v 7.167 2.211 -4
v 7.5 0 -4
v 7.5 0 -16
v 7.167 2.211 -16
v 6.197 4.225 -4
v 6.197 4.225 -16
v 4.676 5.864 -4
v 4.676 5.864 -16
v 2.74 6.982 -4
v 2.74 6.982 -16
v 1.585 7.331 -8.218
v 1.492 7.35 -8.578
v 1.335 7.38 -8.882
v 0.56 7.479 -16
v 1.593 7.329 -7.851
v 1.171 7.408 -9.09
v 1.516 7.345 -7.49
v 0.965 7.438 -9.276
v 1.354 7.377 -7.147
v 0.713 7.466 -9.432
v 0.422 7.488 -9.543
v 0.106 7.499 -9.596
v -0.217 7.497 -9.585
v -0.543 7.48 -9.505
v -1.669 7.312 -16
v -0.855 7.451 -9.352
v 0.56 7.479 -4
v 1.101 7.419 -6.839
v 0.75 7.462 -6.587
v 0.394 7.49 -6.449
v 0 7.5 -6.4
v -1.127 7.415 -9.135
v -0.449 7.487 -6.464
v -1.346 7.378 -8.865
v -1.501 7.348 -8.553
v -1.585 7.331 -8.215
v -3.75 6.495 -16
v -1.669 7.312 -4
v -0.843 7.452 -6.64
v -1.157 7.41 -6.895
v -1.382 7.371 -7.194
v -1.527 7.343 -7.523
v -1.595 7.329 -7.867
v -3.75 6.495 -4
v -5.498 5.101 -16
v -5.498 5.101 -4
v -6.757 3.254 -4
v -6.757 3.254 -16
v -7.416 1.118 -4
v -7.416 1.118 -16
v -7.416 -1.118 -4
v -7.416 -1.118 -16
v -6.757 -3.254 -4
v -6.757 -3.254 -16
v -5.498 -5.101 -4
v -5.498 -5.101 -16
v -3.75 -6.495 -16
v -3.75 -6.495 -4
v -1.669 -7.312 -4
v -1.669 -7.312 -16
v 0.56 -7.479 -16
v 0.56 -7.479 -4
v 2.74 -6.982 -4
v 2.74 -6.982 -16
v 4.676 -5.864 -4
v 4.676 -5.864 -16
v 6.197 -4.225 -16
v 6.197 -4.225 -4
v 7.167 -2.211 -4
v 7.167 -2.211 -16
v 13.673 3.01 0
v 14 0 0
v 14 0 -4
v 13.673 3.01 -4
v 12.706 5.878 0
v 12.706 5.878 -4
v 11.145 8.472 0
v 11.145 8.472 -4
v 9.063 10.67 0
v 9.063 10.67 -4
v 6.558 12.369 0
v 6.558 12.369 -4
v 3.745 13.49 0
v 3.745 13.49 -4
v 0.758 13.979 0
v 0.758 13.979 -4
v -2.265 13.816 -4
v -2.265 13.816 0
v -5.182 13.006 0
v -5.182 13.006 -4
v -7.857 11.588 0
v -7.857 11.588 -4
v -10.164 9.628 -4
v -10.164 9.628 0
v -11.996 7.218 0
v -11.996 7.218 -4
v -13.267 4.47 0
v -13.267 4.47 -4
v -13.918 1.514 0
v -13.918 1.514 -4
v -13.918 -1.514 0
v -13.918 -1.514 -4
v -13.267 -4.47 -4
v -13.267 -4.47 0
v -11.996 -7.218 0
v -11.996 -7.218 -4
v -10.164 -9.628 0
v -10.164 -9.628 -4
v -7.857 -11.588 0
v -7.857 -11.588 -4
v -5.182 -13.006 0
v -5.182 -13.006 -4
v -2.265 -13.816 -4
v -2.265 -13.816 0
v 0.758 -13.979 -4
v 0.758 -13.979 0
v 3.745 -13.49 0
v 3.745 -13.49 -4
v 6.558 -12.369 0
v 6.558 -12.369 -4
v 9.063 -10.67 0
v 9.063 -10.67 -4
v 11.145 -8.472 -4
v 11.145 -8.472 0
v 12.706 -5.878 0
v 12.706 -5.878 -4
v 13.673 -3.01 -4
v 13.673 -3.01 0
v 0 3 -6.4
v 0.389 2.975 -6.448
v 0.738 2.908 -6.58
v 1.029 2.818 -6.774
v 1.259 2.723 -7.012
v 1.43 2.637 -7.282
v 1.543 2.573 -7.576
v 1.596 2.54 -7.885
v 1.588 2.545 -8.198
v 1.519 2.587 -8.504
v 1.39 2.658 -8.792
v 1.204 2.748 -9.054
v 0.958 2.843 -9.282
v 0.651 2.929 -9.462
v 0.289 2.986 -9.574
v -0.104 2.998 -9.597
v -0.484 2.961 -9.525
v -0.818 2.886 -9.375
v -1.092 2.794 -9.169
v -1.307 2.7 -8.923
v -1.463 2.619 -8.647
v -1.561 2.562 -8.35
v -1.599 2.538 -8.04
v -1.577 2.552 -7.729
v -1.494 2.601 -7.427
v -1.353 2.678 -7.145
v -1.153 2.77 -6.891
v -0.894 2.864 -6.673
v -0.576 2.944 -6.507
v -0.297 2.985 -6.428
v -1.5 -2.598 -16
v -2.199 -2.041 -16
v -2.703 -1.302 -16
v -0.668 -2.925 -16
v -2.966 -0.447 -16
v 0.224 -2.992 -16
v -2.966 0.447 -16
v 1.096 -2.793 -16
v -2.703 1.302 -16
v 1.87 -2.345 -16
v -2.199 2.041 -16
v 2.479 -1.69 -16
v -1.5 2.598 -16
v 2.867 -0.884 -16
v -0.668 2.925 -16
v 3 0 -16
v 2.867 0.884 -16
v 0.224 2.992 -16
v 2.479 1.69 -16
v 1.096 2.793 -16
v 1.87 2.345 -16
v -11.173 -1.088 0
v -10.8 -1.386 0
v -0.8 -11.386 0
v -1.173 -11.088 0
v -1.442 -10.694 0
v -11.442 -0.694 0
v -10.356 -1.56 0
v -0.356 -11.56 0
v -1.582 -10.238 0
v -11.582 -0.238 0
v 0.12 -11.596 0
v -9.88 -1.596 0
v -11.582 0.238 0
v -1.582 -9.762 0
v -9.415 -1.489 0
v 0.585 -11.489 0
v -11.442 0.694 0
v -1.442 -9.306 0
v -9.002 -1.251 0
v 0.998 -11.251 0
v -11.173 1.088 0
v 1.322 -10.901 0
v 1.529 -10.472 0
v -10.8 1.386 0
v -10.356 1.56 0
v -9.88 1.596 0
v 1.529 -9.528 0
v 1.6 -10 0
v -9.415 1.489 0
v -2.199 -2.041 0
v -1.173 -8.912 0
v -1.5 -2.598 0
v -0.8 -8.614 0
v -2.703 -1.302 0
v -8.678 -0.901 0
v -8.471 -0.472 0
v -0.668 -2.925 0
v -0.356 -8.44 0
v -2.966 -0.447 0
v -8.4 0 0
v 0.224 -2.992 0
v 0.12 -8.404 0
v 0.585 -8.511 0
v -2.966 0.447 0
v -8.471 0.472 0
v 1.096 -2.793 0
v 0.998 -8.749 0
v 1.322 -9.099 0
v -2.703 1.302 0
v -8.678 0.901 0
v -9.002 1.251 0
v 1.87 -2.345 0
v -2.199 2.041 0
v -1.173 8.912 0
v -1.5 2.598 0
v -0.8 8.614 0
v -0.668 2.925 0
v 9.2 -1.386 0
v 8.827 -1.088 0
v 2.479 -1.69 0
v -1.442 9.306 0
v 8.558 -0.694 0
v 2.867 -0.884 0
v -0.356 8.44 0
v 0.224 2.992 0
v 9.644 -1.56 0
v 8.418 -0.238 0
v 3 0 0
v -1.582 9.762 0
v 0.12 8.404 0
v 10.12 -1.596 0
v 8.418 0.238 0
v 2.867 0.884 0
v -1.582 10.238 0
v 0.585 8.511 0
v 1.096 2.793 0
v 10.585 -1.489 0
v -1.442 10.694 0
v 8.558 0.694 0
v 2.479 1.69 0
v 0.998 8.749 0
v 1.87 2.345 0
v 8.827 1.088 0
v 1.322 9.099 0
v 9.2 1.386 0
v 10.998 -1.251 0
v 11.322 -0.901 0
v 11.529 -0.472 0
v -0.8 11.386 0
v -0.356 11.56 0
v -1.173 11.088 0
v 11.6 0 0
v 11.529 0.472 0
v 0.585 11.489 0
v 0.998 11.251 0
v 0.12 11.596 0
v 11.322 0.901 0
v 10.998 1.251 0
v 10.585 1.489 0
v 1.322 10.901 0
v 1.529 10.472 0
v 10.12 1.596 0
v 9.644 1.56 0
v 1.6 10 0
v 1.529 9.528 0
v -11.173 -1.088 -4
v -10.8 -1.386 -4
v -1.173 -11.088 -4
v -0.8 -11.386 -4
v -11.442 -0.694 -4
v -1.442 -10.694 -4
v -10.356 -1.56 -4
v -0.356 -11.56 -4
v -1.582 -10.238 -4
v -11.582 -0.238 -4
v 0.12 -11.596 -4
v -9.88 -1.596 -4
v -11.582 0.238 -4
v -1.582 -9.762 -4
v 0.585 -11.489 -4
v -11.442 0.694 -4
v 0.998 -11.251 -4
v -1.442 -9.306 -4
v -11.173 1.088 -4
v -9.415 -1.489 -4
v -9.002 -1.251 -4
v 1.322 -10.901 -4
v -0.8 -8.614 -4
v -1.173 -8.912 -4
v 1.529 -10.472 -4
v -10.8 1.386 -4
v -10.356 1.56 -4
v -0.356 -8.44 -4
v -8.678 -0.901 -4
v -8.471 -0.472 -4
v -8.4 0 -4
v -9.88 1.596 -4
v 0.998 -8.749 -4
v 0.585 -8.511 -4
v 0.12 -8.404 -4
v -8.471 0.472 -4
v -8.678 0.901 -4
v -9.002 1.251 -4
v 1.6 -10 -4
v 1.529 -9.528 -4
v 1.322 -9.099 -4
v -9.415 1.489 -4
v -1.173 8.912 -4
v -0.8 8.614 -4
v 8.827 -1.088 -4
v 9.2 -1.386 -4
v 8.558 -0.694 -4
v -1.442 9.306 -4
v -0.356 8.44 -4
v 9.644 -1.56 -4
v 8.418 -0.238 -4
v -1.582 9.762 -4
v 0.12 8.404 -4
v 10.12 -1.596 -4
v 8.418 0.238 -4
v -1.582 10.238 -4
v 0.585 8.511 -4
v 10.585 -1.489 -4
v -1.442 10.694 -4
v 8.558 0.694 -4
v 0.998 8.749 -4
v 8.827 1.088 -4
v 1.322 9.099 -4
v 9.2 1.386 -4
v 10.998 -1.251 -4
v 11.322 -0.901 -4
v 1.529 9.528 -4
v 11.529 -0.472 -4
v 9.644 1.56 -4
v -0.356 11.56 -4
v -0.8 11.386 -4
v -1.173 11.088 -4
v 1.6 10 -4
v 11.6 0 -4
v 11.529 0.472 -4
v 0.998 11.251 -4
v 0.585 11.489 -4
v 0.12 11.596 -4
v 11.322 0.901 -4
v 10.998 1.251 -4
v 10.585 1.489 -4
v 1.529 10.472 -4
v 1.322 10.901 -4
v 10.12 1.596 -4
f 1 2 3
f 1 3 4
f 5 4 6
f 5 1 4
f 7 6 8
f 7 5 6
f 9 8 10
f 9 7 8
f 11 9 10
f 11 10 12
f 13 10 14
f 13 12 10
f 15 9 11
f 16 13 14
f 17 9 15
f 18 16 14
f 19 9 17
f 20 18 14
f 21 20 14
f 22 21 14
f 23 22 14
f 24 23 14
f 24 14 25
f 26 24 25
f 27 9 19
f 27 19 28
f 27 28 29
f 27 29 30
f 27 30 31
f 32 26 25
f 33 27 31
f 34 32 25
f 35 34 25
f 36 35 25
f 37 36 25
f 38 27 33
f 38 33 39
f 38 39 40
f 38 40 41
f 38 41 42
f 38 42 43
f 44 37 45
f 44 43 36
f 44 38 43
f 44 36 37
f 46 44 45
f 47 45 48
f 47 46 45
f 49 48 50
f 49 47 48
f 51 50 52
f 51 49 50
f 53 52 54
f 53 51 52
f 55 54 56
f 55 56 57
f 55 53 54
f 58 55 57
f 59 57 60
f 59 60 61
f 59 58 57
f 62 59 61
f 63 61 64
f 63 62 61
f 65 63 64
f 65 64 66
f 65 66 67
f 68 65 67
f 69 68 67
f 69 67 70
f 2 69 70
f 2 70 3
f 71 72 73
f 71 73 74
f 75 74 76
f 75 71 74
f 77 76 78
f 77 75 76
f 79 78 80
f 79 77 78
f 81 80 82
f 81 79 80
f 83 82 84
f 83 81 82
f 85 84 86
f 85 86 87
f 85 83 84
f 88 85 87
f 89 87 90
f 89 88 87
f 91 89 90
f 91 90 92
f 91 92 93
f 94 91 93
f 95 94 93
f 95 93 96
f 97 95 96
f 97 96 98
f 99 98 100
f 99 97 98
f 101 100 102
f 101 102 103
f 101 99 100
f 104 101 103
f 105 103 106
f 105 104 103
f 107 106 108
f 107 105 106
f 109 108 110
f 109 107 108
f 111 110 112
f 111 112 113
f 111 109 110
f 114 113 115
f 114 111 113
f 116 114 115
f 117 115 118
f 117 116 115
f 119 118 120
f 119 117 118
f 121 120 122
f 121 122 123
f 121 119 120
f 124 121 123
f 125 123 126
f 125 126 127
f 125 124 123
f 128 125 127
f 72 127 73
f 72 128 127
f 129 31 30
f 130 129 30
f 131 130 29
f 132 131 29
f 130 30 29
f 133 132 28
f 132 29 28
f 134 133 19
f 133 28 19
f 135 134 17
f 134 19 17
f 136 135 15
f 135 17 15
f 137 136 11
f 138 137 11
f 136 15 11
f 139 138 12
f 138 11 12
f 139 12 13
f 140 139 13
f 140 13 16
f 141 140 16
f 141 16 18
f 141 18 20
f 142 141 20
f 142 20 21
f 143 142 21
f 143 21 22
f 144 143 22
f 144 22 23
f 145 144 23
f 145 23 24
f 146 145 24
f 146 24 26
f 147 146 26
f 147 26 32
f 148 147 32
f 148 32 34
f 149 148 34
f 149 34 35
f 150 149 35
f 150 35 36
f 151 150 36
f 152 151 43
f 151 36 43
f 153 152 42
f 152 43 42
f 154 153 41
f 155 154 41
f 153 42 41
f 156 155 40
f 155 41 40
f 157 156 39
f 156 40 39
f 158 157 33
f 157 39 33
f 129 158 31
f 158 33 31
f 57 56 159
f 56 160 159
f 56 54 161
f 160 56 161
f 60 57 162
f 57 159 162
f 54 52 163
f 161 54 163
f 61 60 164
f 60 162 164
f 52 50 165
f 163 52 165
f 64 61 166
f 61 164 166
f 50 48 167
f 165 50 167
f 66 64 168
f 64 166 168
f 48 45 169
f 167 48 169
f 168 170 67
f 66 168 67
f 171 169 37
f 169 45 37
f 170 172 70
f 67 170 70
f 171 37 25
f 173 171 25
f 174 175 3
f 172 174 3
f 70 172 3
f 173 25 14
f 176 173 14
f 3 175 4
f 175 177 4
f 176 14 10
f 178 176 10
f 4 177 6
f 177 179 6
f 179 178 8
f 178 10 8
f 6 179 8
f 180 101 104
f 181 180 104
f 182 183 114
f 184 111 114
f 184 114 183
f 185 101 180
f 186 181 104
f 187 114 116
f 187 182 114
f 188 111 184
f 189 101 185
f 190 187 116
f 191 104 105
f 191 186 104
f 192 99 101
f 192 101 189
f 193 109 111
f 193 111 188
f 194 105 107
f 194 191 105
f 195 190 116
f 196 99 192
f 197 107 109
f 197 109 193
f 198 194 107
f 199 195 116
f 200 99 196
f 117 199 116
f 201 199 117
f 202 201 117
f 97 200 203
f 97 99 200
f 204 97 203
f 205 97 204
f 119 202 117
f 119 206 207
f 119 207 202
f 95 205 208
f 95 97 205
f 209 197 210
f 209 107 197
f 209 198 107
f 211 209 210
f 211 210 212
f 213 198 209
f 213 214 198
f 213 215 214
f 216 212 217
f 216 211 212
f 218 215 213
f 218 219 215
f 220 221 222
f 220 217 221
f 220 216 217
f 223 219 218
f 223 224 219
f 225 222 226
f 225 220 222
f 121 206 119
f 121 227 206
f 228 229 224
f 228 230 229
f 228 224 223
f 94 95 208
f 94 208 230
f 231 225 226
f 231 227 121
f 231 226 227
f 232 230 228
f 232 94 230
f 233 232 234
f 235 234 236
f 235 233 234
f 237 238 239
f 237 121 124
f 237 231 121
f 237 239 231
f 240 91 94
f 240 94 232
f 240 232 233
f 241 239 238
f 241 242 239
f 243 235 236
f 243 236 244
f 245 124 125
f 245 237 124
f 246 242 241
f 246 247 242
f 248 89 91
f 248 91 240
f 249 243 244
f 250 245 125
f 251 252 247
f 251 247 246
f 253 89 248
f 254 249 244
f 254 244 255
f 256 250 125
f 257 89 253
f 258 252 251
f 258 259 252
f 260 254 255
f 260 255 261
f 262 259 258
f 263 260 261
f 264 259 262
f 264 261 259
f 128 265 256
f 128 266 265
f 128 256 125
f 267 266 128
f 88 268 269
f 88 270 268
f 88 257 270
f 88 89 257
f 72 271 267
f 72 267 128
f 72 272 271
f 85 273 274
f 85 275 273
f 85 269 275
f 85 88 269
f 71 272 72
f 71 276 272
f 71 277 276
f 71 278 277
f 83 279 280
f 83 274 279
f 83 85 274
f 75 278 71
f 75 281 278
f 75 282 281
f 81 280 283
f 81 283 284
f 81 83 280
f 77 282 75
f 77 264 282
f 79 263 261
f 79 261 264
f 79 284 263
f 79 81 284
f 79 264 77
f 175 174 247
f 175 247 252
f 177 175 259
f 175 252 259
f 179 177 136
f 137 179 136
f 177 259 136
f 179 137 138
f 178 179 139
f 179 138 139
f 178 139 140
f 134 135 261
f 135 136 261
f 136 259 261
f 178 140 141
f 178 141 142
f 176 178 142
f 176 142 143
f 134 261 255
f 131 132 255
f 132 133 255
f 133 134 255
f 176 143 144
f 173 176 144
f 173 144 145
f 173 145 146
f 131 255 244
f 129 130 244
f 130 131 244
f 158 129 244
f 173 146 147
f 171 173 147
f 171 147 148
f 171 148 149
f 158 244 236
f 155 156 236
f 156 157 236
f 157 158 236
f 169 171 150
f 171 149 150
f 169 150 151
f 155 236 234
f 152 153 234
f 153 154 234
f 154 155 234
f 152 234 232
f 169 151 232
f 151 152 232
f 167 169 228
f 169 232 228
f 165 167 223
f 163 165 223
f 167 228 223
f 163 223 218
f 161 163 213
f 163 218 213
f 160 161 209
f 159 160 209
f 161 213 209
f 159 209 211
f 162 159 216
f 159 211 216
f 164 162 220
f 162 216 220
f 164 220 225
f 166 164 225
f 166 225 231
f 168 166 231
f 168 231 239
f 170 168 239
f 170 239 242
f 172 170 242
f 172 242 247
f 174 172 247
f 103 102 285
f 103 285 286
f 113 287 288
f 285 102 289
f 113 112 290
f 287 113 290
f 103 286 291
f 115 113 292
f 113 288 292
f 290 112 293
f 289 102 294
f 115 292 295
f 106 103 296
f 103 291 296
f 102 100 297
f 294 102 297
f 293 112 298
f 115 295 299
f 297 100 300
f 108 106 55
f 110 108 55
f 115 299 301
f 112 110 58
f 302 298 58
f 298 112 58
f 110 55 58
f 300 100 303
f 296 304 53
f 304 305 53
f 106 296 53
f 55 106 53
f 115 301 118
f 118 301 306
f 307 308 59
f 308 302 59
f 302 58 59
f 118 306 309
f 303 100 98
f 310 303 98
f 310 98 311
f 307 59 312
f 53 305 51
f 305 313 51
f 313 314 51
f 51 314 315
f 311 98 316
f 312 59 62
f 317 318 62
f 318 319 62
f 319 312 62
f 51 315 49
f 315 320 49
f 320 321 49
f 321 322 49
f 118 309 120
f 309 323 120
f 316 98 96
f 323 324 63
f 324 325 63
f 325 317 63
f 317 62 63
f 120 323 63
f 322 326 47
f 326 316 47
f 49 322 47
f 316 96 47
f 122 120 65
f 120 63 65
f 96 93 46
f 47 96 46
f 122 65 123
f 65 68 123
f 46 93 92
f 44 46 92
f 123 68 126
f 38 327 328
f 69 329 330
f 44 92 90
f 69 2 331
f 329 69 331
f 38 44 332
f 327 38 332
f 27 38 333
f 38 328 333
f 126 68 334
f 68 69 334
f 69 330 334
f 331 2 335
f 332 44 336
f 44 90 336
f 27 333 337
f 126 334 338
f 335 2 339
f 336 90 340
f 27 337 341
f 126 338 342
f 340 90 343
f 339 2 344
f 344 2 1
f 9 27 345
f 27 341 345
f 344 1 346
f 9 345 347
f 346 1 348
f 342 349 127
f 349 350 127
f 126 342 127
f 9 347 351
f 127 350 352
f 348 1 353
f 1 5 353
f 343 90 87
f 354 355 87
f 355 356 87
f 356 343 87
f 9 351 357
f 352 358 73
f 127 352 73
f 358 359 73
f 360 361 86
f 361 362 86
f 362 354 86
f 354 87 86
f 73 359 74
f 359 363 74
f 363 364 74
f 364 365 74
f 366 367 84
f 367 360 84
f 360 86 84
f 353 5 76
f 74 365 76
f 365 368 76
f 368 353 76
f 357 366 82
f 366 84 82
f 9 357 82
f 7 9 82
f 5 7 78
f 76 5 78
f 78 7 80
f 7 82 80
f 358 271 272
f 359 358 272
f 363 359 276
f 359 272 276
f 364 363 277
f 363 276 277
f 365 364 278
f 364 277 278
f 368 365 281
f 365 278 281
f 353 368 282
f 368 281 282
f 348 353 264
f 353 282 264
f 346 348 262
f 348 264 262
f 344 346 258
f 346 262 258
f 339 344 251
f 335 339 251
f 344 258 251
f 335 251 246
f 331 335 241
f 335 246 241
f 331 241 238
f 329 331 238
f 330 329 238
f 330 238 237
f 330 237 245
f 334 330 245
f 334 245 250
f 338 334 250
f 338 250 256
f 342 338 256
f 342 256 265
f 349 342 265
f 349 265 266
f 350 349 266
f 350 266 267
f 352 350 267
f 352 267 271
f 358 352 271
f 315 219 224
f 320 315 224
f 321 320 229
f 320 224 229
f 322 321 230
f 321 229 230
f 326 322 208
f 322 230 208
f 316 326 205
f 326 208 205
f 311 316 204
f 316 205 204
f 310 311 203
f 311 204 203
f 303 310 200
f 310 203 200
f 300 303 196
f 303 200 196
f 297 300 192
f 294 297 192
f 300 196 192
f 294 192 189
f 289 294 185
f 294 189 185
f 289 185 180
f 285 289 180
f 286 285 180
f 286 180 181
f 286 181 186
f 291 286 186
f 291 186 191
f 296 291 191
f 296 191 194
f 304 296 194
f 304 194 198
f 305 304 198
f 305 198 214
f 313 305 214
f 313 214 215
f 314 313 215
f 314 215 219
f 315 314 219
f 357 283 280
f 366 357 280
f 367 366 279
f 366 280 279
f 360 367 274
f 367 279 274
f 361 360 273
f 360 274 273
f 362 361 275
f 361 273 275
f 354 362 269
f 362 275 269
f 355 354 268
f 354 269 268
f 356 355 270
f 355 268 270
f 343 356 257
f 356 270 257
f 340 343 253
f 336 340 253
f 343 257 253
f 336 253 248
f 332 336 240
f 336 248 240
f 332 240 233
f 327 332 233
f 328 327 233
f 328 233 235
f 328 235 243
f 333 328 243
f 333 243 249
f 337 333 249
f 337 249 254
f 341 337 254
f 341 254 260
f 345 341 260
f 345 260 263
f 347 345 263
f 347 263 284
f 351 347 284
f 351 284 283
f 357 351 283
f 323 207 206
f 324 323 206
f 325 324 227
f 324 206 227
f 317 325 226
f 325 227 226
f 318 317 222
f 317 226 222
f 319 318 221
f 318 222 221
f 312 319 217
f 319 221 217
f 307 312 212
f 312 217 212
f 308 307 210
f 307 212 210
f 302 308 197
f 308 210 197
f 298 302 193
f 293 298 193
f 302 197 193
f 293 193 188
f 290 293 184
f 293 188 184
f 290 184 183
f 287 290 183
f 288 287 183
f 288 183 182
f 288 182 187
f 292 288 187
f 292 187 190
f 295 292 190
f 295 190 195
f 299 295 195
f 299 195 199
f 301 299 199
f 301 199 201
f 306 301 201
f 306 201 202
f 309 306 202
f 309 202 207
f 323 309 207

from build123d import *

# Parameters (mm, degrees)
SKETCH_1_R          = 7.5
EXTRUDE_1_DEPTH     = 16
SKETCH_2_R          = 14
EXTRUDE_2_DEPTH     = 4
SKETCH_3_R          = 3
SKETCH_3_R_2        = 1.6
CUT_EXTRUDE_1_DEPTH = 26.455844123
SKETCH_4_R          = 1.6
CUT_EXTRUDE_2_DEPTH = 7.5


with BuildPart() as part:
    # ｽｹｯﾁ1 → ﾎﾞｽ - 押し出し1 (new body)
    with BuildSketch(Plane.XY):
        Circle(SKETCH_1_R)
    extrude(amount=-EXTRUDE_1_DEPTH)

    # ｽｹｯﾁ2 → ﾎﾞｽ - 押し出し2 (add)
    with BuildSketch(Plane.XY):
        Circle(SKETCH_2_R)
    extrude(amount=-EXTRUDE_2_DEPTH)

    # ｽｹｯﾁ3 → ｶｯﾄ - 押し出し1 (cut, through all)
    with BuildSketch(Plane.XY):
        Circle(SKETCH_3_R)
        with Locations((10, 0)):
            Circle(SKETCH_3_R_2)
        with Locations((0, -10)):
            Circle(SKETCH_3_R_2)
        with Locations((-10, 0)):
            Circle(SKETCH_3_R_2)
        with Locations((0, 10)):
            Circle(SKETCH_3_R_2)
    extrude(amount=-CUT_EXTRUDE_1_DEPTH, mode=Mode.SUBTRACT)

    # ｽｹｯﾁ4 → ｶｯﾄ - 押し出し2 (cut)
    with BuildSketch(Plane(origin=(0, 7.5, 0), x_dir=(1, 0, 0), z_dir=(0, 1, 0))):
        with Locations(Location((0, 8, 0), (0, 0, 270))):
            Circle(SKETCH_4_R)
    extrude(amount=-CUT_EXTRUDE_2_DEPTH, mode=Mode.SUBTRACT)


solid = part.part
